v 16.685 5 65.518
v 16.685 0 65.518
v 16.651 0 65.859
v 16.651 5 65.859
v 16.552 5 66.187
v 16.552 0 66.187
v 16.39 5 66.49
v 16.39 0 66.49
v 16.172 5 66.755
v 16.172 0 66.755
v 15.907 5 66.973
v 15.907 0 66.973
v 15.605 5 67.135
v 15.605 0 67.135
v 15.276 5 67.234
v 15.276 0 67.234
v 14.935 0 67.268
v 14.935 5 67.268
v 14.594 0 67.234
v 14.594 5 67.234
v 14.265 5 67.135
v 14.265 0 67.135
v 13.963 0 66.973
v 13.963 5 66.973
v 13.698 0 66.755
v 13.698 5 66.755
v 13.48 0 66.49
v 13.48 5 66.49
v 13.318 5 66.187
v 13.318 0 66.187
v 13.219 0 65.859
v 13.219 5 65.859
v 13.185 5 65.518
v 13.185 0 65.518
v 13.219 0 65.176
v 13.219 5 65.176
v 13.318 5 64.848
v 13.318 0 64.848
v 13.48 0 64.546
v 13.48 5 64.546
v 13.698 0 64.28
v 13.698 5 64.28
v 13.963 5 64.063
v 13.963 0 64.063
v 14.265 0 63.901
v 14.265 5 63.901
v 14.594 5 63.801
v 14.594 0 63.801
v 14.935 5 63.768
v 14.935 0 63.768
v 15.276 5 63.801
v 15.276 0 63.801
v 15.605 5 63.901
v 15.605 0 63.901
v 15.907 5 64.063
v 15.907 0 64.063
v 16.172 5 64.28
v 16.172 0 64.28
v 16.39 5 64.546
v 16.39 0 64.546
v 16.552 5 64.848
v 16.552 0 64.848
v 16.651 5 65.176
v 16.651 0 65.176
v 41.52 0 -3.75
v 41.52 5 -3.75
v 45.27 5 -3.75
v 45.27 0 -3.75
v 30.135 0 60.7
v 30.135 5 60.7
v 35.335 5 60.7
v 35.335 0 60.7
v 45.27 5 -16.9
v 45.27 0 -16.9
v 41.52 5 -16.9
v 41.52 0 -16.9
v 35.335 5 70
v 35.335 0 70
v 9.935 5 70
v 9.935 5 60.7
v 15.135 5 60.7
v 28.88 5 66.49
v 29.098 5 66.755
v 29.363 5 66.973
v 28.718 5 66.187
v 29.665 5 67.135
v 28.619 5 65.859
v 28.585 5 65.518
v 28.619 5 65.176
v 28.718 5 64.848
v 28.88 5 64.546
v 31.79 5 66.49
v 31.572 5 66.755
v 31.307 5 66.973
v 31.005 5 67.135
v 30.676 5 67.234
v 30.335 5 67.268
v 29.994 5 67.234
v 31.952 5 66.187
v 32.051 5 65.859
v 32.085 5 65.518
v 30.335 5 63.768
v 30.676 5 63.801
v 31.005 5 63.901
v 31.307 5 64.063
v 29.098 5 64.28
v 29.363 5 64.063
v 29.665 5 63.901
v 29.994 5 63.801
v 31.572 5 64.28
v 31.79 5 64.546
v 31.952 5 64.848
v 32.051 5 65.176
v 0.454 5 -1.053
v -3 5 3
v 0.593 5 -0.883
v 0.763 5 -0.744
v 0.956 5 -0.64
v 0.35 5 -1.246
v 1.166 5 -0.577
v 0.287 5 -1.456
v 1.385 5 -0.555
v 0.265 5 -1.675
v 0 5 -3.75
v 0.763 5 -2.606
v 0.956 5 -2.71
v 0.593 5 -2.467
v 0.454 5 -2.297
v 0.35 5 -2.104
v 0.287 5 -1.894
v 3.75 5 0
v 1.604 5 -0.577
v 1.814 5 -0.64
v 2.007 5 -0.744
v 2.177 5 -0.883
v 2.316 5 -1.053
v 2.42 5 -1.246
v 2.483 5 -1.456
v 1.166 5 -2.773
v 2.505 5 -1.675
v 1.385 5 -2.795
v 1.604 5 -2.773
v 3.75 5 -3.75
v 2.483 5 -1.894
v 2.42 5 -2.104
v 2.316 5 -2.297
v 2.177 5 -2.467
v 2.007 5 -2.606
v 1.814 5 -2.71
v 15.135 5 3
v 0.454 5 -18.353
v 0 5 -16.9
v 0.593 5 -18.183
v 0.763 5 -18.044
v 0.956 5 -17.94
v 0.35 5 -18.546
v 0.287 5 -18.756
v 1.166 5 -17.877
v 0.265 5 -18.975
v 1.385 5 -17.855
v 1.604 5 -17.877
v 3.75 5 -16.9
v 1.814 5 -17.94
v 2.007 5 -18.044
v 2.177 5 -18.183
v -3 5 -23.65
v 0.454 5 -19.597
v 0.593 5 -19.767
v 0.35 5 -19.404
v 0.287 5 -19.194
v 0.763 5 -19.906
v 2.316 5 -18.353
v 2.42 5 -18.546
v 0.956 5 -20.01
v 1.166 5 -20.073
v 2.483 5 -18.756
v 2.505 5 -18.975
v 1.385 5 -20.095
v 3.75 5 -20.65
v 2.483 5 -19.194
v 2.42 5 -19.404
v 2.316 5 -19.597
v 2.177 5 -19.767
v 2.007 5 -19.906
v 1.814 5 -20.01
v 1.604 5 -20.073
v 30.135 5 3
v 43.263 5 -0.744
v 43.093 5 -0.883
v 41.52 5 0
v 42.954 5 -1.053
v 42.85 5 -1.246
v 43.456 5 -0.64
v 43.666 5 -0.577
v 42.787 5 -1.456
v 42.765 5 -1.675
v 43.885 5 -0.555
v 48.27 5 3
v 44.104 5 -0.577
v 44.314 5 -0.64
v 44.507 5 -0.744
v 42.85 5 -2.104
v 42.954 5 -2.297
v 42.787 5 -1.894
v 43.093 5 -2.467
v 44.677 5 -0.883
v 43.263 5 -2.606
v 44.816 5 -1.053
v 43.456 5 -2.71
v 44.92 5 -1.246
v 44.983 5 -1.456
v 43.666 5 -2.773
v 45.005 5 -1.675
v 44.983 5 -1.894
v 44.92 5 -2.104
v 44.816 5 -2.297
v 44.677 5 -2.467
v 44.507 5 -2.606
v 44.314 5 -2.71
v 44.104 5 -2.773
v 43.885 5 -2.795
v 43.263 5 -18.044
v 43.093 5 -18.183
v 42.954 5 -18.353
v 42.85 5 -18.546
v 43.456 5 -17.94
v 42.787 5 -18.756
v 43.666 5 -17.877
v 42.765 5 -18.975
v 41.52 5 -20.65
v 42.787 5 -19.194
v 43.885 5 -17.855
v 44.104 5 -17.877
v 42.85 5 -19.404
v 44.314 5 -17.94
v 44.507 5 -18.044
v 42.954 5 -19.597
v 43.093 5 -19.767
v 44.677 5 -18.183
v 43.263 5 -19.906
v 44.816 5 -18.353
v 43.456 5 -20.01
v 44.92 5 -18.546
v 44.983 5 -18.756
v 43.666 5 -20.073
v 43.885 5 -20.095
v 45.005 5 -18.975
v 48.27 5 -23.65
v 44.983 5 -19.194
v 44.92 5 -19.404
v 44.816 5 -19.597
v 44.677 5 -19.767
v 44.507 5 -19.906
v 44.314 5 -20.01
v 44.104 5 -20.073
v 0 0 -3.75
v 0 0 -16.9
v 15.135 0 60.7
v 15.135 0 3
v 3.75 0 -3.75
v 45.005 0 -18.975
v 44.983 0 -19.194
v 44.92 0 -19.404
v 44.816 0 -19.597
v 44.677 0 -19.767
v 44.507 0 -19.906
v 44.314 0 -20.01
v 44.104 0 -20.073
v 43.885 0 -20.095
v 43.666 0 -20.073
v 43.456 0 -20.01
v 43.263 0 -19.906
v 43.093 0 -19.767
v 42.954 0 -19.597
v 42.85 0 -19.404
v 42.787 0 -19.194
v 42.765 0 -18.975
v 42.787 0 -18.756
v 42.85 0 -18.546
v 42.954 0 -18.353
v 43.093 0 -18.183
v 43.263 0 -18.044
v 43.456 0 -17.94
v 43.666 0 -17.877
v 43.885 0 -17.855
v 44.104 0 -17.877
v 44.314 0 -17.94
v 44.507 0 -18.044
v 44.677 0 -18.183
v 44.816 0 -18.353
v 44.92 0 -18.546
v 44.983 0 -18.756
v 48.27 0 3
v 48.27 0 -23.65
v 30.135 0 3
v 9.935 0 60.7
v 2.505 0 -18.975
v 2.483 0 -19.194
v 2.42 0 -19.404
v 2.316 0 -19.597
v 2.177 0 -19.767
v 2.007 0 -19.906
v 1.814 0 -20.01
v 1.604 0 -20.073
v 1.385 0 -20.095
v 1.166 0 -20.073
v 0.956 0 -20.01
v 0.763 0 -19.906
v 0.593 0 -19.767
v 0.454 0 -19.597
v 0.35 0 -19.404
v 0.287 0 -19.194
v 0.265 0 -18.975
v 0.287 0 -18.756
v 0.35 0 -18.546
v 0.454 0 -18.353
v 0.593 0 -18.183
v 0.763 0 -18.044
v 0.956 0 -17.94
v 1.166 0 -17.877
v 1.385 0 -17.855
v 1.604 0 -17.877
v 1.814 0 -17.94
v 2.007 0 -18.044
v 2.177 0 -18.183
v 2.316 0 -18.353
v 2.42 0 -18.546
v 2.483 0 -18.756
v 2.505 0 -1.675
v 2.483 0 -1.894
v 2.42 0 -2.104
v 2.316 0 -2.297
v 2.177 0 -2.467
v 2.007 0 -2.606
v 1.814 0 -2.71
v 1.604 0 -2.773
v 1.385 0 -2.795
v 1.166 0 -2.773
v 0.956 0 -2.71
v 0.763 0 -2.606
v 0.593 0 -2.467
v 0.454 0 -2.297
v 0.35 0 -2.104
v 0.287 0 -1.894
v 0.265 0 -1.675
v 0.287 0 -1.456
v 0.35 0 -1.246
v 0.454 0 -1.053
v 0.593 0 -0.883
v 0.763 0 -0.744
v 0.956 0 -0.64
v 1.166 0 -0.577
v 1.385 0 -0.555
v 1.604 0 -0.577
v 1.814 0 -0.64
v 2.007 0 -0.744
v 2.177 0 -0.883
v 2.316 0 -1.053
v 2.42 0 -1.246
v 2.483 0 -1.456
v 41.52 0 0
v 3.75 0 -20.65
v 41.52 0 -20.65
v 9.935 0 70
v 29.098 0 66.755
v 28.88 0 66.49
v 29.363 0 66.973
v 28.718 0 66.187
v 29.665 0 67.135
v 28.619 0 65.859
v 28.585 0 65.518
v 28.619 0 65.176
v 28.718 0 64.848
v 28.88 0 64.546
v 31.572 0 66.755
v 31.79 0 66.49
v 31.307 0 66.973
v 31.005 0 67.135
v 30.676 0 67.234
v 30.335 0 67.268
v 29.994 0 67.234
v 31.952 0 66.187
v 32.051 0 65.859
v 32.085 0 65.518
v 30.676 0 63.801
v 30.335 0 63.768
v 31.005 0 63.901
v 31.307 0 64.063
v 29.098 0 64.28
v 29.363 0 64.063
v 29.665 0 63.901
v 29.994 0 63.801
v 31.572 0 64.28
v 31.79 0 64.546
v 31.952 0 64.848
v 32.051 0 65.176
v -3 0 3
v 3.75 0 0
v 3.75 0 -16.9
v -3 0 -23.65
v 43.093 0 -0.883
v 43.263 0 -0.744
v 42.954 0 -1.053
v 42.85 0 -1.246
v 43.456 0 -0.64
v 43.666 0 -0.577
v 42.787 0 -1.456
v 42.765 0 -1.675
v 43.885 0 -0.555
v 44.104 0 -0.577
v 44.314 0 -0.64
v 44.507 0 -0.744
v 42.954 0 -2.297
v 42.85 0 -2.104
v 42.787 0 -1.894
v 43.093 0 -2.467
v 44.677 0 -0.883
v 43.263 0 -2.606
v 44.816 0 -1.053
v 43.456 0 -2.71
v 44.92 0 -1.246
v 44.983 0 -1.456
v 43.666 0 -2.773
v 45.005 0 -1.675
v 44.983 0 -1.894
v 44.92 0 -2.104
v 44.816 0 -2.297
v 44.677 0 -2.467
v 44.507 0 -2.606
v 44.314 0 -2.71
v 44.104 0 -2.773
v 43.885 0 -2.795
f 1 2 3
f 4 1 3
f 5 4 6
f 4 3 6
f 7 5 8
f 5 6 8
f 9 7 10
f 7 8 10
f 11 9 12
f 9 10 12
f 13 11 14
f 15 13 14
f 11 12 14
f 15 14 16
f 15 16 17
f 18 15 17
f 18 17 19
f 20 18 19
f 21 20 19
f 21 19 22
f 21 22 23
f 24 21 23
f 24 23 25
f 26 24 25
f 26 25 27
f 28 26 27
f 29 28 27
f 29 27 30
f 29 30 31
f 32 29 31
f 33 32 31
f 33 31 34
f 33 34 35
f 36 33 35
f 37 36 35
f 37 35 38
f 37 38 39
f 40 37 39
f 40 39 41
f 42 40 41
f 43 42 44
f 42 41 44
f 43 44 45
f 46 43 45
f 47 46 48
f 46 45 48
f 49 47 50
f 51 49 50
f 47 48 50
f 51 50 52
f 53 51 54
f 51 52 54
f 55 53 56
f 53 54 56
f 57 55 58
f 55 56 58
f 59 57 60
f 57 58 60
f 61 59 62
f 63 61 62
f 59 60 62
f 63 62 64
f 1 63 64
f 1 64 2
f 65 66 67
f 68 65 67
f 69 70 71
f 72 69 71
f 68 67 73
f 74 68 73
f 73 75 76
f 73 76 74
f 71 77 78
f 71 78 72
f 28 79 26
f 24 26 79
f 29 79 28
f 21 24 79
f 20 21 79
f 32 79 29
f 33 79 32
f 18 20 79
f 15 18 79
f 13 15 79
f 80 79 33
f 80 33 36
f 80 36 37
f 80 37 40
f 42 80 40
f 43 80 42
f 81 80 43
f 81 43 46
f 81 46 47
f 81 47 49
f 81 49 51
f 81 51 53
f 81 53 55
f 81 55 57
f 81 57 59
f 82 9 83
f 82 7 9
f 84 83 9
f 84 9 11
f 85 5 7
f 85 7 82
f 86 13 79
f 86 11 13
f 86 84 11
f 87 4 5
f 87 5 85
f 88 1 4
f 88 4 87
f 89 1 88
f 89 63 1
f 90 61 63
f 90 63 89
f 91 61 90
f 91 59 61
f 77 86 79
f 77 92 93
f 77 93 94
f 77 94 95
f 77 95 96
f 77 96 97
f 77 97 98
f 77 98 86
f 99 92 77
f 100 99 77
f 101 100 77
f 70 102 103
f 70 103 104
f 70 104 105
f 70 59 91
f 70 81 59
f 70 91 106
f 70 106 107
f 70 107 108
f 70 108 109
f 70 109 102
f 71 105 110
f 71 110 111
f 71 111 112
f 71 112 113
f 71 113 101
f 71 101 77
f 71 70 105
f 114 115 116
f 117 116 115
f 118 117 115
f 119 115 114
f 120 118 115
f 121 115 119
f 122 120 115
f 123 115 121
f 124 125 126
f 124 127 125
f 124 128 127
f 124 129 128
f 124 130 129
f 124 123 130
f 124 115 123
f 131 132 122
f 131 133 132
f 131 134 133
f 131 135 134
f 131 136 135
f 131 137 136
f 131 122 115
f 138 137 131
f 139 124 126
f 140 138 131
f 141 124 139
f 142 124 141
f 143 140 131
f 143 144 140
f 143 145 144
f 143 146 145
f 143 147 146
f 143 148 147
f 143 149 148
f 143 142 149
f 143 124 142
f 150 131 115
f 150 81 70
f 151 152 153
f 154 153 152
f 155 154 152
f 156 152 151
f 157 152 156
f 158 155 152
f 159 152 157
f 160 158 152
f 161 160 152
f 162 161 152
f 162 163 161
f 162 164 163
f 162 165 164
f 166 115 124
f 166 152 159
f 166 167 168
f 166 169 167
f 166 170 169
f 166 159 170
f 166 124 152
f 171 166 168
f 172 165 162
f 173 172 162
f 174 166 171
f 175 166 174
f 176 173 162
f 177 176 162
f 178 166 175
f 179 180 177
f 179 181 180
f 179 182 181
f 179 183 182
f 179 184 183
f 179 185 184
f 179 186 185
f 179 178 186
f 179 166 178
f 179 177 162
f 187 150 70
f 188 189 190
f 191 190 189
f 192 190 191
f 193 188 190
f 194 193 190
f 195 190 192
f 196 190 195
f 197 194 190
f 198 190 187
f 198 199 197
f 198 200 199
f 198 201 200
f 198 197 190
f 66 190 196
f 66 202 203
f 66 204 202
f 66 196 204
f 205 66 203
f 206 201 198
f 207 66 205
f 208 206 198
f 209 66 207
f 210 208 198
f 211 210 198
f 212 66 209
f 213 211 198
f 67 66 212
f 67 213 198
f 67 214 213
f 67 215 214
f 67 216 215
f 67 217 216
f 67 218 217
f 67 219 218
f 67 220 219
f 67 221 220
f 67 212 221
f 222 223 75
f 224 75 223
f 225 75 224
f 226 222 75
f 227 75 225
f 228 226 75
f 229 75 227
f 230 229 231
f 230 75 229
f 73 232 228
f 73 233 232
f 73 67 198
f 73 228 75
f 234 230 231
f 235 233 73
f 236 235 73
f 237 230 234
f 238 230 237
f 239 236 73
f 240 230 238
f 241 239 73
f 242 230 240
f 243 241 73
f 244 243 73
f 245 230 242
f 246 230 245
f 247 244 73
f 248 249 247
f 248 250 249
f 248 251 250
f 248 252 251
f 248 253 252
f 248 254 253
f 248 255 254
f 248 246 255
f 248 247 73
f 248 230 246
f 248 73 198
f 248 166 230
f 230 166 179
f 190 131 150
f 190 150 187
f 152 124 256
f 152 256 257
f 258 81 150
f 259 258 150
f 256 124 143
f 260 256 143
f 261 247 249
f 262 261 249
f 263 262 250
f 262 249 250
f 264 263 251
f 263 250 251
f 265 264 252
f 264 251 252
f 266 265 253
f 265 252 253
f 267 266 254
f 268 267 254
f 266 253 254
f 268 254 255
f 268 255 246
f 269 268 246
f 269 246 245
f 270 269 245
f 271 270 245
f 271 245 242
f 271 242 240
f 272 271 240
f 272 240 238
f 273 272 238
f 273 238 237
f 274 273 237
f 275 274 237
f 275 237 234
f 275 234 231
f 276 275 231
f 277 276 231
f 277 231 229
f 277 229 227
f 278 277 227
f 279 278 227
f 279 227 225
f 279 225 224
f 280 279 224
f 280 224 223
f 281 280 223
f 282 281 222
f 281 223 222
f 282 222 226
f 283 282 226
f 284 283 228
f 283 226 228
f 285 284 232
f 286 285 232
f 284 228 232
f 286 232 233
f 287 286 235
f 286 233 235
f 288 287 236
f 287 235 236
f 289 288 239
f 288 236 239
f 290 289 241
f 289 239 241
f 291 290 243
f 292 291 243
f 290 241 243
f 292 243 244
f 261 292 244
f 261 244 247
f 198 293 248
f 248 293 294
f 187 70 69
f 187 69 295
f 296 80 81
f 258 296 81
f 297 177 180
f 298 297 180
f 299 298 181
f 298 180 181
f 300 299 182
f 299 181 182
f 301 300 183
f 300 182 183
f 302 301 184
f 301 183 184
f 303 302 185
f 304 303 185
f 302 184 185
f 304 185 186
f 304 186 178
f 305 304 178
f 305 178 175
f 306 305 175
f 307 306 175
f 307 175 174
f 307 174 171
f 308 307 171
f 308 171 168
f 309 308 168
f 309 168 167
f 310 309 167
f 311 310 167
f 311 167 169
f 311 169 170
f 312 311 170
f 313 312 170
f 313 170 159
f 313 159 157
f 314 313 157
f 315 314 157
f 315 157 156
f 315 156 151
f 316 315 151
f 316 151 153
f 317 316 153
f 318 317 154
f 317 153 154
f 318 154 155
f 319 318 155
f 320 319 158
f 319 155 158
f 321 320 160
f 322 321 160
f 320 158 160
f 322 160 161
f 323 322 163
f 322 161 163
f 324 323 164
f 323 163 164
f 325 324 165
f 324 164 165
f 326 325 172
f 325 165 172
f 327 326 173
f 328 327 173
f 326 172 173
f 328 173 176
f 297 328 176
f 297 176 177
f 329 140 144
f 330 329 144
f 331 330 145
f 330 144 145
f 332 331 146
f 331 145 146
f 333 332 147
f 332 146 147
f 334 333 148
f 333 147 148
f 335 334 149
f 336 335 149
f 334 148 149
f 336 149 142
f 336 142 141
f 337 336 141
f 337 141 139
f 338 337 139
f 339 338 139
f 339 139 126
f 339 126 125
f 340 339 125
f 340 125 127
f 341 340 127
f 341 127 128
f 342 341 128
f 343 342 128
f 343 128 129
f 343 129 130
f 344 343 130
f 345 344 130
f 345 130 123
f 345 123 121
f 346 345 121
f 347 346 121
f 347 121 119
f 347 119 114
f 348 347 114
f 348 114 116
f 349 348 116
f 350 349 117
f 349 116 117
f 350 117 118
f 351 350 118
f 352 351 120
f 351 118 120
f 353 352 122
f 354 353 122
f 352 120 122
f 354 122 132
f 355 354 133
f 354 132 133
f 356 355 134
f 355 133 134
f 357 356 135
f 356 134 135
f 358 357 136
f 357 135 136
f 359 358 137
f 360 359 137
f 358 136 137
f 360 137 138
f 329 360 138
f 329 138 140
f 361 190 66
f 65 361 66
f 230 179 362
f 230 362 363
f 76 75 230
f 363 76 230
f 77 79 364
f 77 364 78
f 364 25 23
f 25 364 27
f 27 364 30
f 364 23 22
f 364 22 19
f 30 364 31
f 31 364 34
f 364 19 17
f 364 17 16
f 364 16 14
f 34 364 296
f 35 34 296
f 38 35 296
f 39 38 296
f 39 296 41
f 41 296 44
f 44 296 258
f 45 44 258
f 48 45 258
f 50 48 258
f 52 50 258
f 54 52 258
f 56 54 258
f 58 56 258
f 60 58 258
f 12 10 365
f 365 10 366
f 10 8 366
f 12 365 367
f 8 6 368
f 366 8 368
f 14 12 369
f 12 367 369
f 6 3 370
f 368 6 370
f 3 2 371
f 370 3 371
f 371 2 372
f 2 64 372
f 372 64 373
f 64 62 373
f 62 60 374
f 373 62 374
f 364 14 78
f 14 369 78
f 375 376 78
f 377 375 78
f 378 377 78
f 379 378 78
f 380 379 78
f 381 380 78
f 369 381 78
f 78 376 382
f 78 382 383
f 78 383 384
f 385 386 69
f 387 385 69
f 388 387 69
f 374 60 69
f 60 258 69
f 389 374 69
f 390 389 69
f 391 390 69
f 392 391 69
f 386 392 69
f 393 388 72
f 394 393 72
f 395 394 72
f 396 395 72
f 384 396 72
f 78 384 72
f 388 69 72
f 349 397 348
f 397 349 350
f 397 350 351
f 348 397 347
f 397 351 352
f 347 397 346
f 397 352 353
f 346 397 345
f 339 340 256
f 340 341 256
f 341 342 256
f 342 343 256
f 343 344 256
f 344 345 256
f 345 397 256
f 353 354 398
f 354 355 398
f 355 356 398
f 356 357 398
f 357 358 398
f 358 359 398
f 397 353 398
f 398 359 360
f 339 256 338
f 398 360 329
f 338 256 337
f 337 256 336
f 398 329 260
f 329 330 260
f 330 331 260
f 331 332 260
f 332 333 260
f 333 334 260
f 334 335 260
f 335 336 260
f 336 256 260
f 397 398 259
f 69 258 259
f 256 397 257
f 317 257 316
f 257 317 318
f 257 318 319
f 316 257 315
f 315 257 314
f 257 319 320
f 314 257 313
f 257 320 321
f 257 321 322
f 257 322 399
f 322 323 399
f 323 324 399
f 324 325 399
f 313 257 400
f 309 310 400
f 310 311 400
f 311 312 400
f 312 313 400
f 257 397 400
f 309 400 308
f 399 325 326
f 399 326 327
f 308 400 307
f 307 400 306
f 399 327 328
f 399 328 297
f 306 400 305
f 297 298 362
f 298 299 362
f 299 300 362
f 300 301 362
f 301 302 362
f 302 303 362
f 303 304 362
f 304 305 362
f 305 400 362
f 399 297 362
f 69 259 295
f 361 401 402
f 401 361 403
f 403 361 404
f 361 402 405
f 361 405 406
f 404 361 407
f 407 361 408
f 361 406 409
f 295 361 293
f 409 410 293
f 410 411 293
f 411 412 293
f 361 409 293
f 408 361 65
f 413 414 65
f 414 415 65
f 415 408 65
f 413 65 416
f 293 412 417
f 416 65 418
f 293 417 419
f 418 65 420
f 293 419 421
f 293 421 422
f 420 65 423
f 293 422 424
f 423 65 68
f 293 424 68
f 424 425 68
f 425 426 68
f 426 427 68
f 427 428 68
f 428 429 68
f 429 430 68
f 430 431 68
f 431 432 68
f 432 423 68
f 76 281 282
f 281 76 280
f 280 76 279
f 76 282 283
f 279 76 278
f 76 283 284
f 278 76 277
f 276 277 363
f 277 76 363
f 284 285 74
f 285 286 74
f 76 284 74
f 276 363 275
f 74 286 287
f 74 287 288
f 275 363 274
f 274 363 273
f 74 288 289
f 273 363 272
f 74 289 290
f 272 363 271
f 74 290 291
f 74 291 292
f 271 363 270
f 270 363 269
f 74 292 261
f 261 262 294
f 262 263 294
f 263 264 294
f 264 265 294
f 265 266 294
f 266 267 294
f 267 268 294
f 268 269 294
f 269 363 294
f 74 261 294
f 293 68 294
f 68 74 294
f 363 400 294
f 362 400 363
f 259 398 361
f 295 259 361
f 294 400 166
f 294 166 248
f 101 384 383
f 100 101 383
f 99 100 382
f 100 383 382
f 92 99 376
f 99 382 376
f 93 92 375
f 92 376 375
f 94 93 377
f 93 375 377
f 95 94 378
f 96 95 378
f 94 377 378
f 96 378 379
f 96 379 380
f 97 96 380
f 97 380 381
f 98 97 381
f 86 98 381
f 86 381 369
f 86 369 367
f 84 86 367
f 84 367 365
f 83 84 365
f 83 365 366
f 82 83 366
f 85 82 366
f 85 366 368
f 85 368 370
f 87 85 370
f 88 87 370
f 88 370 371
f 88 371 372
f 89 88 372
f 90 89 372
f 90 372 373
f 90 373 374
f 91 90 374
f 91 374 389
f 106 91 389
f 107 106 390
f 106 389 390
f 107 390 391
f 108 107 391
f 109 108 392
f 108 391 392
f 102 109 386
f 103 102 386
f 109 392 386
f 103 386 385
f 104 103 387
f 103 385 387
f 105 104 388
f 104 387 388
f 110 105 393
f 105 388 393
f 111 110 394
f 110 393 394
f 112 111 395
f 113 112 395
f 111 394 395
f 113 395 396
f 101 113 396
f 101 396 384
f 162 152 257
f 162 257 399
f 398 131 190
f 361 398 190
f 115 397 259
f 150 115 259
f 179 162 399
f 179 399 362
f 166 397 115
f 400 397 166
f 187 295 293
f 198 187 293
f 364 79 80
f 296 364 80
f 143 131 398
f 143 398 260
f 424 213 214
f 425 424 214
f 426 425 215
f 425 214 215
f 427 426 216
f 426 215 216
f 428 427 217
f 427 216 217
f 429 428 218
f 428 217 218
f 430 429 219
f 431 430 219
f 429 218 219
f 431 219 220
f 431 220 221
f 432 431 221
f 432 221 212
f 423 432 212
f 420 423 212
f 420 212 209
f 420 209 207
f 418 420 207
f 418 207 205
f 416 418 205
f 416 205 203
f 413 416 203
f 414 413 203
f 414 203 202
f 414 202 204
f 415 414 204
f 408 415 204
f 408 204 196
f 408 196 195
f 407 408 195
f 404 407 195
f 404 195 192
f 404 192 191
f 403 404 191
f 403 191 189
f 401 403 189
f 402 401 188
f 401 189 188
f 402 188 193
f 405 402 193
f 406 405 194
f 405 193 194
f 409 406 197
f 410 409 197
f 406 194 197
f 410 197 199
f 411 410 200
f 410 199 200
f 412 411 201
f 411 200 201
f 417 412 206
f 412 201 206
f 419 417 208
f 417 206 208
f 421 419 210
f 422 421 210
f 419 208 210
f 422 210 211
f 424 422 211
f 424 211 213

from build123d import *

# Parameters (mm, degrees)
SKETCH2_W           = 51.27
SKETCH2_H           = 26.65
BOSS_EXTRUDE2_DEPTH = 5
SKETCH3_W           = 45.27
SKETCH3_H           = 20.65
CUT_EXTRUDE1_DEPTH  = 6
SKETCH4_W           = 3.75
SKETCH4_H           = 3.75
BOSS_EXTRUDE3_DEPTH = 5
SKETCH5_R           = 1.12
CUT_EXTRUDE2_DEPTH  = 6
SKETCH6_W           = 15
SKETCH6_H           = 57.7
BOSS_EXTRUDE4_DEPTH = 5
SKETCH7_W           = 25.4
SKETCH7_H           = 9.5
BOSS_EXTRUDE5_DEPTH = 5
SKETCH11_R          = 1.75
CUT_EXTRUDE5_DEPTH  = 6
SKETCH12_W          = 25.4
SKETCH12_H          = 0.2
CUT_EXTRUDE6_DEPTH  = 6


with BuildPart() as part:
    # Sketch2 → Boss-Extrude2 (new body)
    with BuildSketch(Plane(origin=(0, 0, 0), x_dir=(1, 0, 0), z_dir=(0, 1, 0))):
        with Locations((22.635, 10.325)):
            Rectangle(SKETCH2_W, SKETCH2_H)
    extrude(amount=BOSS_EXTRUDE2_DEPTH)

    # Sketch3 → Cut-Extrude1 (cut, through all)
    with BuildSketch(Plane(origin=(0, 5, 0), x_dir=(1, 0, 0), z_dir=(0, 1, 0))):
        with Locations((22.635, 10.325)):
            Rectangle(SKETCH3_W, SKETCH3_H)
    extrude(amount=-CUT_EXTRUDE1_DEPTH, mode=Mode.SUBTRACT)

    # Sketch4 → Boss-Extrude3 (add)
    with BuildSketch(Plane(origin=(0, 5, 0), x_dir=(1, 0, 0), z_dir=(0, 1, 0))):
        with Locations((1.875, 18.775)):
            Rectangle(SKETCH4_W, SKETCH4_H)
        with Locations((1.875, 1.875)):
            Rectangle(SKETCH4_W, SKETCH4_H)
        with Locations((43.395, 1.875)):
            Rectangle(SKETCH4_W, SKETCH4_H)
        with Locations((43.395, 18.775)):
            Rectangle(SKETCH4_W, SKETCH4_H)
    extrude(amount=-BOSS_EXTRUDE3_DEPTH)

    # Sketch5 → Cut-Extrude2 (cut, through all)
    with BuildSketch(Plane(origin=(0, 5, 0), x_dir=(1, 0, 0), z_dir=(0, 1, 0))):
        with Locations((1.385, 18.975)):
            Circle(SKETCH5_R)
        with Locations((43.885, 18.975)):
            Circle(SKETCH5_R)
        with Locations((43.885, 1.675)):
            Circle(SKETCH5_R)
        with Locations((1.385, 1.675)):
            Circle(SKETCH5_R)
    extrude(amount=-CUT_EXTRUDE2_DEPTH, mode=Mode.SUBTRACT)

    # Sketch6 → Boss-Extrude4 (add)
    with BuildSketch(Plane(origin=(0, 5, 0), x_dir=(1, 0, 0), z_dir=(0, 1, 0))):
        with Locations((22.635, -31.85)):
            Rectangle(SKETCH6_W, SKETCH6_H)
    extrude(amount=-BOSS_EXTRUDE4_DEPTH)

    # Sketch7 → Boss-Extrude5 (add)
    with BuildSketch(Plane(origin=(0, 5, 0), x_dir=(1, 0, 0), z_dir=(0, 1, 0))):
        with Locations((22.635, -65.45)):
            Rectangle(SKETCH7_W, SKETCH7_H)
    extrude(amount=-BOSS_EXTRUDE5_DEPTH)

    # Sketch11 → Cut-Extrude5 (cut, through all)
    with BuildSketch(Plane.XZ):
        with Locations((30.335, 65.51777032)):
            Circle(SKETCH11_R)
        with Locations((14.935, 65.51777032)):
            Circle(SKETCH11_R)
    extrude(amount=-CUT_EXTRUDE5_DEPTH, mode=Mode.SUBTRACT)

    # Sketch12 → Cut-Extrude6 (cut, through all)
    with BuildSketch(Plane(origin=(0, 5, 0), x_dir=(1, 0, 0), z_dir=(0, 1, 0))):
        with Locations((22.635, -70.1)):
            Rectangle(SKETCH12_W, SKETCH12_H)
    extrude(amount=-CUT_EXTRUDE6_DEPTH, mode=Mode.SUBTRACT)


solid = part.part
